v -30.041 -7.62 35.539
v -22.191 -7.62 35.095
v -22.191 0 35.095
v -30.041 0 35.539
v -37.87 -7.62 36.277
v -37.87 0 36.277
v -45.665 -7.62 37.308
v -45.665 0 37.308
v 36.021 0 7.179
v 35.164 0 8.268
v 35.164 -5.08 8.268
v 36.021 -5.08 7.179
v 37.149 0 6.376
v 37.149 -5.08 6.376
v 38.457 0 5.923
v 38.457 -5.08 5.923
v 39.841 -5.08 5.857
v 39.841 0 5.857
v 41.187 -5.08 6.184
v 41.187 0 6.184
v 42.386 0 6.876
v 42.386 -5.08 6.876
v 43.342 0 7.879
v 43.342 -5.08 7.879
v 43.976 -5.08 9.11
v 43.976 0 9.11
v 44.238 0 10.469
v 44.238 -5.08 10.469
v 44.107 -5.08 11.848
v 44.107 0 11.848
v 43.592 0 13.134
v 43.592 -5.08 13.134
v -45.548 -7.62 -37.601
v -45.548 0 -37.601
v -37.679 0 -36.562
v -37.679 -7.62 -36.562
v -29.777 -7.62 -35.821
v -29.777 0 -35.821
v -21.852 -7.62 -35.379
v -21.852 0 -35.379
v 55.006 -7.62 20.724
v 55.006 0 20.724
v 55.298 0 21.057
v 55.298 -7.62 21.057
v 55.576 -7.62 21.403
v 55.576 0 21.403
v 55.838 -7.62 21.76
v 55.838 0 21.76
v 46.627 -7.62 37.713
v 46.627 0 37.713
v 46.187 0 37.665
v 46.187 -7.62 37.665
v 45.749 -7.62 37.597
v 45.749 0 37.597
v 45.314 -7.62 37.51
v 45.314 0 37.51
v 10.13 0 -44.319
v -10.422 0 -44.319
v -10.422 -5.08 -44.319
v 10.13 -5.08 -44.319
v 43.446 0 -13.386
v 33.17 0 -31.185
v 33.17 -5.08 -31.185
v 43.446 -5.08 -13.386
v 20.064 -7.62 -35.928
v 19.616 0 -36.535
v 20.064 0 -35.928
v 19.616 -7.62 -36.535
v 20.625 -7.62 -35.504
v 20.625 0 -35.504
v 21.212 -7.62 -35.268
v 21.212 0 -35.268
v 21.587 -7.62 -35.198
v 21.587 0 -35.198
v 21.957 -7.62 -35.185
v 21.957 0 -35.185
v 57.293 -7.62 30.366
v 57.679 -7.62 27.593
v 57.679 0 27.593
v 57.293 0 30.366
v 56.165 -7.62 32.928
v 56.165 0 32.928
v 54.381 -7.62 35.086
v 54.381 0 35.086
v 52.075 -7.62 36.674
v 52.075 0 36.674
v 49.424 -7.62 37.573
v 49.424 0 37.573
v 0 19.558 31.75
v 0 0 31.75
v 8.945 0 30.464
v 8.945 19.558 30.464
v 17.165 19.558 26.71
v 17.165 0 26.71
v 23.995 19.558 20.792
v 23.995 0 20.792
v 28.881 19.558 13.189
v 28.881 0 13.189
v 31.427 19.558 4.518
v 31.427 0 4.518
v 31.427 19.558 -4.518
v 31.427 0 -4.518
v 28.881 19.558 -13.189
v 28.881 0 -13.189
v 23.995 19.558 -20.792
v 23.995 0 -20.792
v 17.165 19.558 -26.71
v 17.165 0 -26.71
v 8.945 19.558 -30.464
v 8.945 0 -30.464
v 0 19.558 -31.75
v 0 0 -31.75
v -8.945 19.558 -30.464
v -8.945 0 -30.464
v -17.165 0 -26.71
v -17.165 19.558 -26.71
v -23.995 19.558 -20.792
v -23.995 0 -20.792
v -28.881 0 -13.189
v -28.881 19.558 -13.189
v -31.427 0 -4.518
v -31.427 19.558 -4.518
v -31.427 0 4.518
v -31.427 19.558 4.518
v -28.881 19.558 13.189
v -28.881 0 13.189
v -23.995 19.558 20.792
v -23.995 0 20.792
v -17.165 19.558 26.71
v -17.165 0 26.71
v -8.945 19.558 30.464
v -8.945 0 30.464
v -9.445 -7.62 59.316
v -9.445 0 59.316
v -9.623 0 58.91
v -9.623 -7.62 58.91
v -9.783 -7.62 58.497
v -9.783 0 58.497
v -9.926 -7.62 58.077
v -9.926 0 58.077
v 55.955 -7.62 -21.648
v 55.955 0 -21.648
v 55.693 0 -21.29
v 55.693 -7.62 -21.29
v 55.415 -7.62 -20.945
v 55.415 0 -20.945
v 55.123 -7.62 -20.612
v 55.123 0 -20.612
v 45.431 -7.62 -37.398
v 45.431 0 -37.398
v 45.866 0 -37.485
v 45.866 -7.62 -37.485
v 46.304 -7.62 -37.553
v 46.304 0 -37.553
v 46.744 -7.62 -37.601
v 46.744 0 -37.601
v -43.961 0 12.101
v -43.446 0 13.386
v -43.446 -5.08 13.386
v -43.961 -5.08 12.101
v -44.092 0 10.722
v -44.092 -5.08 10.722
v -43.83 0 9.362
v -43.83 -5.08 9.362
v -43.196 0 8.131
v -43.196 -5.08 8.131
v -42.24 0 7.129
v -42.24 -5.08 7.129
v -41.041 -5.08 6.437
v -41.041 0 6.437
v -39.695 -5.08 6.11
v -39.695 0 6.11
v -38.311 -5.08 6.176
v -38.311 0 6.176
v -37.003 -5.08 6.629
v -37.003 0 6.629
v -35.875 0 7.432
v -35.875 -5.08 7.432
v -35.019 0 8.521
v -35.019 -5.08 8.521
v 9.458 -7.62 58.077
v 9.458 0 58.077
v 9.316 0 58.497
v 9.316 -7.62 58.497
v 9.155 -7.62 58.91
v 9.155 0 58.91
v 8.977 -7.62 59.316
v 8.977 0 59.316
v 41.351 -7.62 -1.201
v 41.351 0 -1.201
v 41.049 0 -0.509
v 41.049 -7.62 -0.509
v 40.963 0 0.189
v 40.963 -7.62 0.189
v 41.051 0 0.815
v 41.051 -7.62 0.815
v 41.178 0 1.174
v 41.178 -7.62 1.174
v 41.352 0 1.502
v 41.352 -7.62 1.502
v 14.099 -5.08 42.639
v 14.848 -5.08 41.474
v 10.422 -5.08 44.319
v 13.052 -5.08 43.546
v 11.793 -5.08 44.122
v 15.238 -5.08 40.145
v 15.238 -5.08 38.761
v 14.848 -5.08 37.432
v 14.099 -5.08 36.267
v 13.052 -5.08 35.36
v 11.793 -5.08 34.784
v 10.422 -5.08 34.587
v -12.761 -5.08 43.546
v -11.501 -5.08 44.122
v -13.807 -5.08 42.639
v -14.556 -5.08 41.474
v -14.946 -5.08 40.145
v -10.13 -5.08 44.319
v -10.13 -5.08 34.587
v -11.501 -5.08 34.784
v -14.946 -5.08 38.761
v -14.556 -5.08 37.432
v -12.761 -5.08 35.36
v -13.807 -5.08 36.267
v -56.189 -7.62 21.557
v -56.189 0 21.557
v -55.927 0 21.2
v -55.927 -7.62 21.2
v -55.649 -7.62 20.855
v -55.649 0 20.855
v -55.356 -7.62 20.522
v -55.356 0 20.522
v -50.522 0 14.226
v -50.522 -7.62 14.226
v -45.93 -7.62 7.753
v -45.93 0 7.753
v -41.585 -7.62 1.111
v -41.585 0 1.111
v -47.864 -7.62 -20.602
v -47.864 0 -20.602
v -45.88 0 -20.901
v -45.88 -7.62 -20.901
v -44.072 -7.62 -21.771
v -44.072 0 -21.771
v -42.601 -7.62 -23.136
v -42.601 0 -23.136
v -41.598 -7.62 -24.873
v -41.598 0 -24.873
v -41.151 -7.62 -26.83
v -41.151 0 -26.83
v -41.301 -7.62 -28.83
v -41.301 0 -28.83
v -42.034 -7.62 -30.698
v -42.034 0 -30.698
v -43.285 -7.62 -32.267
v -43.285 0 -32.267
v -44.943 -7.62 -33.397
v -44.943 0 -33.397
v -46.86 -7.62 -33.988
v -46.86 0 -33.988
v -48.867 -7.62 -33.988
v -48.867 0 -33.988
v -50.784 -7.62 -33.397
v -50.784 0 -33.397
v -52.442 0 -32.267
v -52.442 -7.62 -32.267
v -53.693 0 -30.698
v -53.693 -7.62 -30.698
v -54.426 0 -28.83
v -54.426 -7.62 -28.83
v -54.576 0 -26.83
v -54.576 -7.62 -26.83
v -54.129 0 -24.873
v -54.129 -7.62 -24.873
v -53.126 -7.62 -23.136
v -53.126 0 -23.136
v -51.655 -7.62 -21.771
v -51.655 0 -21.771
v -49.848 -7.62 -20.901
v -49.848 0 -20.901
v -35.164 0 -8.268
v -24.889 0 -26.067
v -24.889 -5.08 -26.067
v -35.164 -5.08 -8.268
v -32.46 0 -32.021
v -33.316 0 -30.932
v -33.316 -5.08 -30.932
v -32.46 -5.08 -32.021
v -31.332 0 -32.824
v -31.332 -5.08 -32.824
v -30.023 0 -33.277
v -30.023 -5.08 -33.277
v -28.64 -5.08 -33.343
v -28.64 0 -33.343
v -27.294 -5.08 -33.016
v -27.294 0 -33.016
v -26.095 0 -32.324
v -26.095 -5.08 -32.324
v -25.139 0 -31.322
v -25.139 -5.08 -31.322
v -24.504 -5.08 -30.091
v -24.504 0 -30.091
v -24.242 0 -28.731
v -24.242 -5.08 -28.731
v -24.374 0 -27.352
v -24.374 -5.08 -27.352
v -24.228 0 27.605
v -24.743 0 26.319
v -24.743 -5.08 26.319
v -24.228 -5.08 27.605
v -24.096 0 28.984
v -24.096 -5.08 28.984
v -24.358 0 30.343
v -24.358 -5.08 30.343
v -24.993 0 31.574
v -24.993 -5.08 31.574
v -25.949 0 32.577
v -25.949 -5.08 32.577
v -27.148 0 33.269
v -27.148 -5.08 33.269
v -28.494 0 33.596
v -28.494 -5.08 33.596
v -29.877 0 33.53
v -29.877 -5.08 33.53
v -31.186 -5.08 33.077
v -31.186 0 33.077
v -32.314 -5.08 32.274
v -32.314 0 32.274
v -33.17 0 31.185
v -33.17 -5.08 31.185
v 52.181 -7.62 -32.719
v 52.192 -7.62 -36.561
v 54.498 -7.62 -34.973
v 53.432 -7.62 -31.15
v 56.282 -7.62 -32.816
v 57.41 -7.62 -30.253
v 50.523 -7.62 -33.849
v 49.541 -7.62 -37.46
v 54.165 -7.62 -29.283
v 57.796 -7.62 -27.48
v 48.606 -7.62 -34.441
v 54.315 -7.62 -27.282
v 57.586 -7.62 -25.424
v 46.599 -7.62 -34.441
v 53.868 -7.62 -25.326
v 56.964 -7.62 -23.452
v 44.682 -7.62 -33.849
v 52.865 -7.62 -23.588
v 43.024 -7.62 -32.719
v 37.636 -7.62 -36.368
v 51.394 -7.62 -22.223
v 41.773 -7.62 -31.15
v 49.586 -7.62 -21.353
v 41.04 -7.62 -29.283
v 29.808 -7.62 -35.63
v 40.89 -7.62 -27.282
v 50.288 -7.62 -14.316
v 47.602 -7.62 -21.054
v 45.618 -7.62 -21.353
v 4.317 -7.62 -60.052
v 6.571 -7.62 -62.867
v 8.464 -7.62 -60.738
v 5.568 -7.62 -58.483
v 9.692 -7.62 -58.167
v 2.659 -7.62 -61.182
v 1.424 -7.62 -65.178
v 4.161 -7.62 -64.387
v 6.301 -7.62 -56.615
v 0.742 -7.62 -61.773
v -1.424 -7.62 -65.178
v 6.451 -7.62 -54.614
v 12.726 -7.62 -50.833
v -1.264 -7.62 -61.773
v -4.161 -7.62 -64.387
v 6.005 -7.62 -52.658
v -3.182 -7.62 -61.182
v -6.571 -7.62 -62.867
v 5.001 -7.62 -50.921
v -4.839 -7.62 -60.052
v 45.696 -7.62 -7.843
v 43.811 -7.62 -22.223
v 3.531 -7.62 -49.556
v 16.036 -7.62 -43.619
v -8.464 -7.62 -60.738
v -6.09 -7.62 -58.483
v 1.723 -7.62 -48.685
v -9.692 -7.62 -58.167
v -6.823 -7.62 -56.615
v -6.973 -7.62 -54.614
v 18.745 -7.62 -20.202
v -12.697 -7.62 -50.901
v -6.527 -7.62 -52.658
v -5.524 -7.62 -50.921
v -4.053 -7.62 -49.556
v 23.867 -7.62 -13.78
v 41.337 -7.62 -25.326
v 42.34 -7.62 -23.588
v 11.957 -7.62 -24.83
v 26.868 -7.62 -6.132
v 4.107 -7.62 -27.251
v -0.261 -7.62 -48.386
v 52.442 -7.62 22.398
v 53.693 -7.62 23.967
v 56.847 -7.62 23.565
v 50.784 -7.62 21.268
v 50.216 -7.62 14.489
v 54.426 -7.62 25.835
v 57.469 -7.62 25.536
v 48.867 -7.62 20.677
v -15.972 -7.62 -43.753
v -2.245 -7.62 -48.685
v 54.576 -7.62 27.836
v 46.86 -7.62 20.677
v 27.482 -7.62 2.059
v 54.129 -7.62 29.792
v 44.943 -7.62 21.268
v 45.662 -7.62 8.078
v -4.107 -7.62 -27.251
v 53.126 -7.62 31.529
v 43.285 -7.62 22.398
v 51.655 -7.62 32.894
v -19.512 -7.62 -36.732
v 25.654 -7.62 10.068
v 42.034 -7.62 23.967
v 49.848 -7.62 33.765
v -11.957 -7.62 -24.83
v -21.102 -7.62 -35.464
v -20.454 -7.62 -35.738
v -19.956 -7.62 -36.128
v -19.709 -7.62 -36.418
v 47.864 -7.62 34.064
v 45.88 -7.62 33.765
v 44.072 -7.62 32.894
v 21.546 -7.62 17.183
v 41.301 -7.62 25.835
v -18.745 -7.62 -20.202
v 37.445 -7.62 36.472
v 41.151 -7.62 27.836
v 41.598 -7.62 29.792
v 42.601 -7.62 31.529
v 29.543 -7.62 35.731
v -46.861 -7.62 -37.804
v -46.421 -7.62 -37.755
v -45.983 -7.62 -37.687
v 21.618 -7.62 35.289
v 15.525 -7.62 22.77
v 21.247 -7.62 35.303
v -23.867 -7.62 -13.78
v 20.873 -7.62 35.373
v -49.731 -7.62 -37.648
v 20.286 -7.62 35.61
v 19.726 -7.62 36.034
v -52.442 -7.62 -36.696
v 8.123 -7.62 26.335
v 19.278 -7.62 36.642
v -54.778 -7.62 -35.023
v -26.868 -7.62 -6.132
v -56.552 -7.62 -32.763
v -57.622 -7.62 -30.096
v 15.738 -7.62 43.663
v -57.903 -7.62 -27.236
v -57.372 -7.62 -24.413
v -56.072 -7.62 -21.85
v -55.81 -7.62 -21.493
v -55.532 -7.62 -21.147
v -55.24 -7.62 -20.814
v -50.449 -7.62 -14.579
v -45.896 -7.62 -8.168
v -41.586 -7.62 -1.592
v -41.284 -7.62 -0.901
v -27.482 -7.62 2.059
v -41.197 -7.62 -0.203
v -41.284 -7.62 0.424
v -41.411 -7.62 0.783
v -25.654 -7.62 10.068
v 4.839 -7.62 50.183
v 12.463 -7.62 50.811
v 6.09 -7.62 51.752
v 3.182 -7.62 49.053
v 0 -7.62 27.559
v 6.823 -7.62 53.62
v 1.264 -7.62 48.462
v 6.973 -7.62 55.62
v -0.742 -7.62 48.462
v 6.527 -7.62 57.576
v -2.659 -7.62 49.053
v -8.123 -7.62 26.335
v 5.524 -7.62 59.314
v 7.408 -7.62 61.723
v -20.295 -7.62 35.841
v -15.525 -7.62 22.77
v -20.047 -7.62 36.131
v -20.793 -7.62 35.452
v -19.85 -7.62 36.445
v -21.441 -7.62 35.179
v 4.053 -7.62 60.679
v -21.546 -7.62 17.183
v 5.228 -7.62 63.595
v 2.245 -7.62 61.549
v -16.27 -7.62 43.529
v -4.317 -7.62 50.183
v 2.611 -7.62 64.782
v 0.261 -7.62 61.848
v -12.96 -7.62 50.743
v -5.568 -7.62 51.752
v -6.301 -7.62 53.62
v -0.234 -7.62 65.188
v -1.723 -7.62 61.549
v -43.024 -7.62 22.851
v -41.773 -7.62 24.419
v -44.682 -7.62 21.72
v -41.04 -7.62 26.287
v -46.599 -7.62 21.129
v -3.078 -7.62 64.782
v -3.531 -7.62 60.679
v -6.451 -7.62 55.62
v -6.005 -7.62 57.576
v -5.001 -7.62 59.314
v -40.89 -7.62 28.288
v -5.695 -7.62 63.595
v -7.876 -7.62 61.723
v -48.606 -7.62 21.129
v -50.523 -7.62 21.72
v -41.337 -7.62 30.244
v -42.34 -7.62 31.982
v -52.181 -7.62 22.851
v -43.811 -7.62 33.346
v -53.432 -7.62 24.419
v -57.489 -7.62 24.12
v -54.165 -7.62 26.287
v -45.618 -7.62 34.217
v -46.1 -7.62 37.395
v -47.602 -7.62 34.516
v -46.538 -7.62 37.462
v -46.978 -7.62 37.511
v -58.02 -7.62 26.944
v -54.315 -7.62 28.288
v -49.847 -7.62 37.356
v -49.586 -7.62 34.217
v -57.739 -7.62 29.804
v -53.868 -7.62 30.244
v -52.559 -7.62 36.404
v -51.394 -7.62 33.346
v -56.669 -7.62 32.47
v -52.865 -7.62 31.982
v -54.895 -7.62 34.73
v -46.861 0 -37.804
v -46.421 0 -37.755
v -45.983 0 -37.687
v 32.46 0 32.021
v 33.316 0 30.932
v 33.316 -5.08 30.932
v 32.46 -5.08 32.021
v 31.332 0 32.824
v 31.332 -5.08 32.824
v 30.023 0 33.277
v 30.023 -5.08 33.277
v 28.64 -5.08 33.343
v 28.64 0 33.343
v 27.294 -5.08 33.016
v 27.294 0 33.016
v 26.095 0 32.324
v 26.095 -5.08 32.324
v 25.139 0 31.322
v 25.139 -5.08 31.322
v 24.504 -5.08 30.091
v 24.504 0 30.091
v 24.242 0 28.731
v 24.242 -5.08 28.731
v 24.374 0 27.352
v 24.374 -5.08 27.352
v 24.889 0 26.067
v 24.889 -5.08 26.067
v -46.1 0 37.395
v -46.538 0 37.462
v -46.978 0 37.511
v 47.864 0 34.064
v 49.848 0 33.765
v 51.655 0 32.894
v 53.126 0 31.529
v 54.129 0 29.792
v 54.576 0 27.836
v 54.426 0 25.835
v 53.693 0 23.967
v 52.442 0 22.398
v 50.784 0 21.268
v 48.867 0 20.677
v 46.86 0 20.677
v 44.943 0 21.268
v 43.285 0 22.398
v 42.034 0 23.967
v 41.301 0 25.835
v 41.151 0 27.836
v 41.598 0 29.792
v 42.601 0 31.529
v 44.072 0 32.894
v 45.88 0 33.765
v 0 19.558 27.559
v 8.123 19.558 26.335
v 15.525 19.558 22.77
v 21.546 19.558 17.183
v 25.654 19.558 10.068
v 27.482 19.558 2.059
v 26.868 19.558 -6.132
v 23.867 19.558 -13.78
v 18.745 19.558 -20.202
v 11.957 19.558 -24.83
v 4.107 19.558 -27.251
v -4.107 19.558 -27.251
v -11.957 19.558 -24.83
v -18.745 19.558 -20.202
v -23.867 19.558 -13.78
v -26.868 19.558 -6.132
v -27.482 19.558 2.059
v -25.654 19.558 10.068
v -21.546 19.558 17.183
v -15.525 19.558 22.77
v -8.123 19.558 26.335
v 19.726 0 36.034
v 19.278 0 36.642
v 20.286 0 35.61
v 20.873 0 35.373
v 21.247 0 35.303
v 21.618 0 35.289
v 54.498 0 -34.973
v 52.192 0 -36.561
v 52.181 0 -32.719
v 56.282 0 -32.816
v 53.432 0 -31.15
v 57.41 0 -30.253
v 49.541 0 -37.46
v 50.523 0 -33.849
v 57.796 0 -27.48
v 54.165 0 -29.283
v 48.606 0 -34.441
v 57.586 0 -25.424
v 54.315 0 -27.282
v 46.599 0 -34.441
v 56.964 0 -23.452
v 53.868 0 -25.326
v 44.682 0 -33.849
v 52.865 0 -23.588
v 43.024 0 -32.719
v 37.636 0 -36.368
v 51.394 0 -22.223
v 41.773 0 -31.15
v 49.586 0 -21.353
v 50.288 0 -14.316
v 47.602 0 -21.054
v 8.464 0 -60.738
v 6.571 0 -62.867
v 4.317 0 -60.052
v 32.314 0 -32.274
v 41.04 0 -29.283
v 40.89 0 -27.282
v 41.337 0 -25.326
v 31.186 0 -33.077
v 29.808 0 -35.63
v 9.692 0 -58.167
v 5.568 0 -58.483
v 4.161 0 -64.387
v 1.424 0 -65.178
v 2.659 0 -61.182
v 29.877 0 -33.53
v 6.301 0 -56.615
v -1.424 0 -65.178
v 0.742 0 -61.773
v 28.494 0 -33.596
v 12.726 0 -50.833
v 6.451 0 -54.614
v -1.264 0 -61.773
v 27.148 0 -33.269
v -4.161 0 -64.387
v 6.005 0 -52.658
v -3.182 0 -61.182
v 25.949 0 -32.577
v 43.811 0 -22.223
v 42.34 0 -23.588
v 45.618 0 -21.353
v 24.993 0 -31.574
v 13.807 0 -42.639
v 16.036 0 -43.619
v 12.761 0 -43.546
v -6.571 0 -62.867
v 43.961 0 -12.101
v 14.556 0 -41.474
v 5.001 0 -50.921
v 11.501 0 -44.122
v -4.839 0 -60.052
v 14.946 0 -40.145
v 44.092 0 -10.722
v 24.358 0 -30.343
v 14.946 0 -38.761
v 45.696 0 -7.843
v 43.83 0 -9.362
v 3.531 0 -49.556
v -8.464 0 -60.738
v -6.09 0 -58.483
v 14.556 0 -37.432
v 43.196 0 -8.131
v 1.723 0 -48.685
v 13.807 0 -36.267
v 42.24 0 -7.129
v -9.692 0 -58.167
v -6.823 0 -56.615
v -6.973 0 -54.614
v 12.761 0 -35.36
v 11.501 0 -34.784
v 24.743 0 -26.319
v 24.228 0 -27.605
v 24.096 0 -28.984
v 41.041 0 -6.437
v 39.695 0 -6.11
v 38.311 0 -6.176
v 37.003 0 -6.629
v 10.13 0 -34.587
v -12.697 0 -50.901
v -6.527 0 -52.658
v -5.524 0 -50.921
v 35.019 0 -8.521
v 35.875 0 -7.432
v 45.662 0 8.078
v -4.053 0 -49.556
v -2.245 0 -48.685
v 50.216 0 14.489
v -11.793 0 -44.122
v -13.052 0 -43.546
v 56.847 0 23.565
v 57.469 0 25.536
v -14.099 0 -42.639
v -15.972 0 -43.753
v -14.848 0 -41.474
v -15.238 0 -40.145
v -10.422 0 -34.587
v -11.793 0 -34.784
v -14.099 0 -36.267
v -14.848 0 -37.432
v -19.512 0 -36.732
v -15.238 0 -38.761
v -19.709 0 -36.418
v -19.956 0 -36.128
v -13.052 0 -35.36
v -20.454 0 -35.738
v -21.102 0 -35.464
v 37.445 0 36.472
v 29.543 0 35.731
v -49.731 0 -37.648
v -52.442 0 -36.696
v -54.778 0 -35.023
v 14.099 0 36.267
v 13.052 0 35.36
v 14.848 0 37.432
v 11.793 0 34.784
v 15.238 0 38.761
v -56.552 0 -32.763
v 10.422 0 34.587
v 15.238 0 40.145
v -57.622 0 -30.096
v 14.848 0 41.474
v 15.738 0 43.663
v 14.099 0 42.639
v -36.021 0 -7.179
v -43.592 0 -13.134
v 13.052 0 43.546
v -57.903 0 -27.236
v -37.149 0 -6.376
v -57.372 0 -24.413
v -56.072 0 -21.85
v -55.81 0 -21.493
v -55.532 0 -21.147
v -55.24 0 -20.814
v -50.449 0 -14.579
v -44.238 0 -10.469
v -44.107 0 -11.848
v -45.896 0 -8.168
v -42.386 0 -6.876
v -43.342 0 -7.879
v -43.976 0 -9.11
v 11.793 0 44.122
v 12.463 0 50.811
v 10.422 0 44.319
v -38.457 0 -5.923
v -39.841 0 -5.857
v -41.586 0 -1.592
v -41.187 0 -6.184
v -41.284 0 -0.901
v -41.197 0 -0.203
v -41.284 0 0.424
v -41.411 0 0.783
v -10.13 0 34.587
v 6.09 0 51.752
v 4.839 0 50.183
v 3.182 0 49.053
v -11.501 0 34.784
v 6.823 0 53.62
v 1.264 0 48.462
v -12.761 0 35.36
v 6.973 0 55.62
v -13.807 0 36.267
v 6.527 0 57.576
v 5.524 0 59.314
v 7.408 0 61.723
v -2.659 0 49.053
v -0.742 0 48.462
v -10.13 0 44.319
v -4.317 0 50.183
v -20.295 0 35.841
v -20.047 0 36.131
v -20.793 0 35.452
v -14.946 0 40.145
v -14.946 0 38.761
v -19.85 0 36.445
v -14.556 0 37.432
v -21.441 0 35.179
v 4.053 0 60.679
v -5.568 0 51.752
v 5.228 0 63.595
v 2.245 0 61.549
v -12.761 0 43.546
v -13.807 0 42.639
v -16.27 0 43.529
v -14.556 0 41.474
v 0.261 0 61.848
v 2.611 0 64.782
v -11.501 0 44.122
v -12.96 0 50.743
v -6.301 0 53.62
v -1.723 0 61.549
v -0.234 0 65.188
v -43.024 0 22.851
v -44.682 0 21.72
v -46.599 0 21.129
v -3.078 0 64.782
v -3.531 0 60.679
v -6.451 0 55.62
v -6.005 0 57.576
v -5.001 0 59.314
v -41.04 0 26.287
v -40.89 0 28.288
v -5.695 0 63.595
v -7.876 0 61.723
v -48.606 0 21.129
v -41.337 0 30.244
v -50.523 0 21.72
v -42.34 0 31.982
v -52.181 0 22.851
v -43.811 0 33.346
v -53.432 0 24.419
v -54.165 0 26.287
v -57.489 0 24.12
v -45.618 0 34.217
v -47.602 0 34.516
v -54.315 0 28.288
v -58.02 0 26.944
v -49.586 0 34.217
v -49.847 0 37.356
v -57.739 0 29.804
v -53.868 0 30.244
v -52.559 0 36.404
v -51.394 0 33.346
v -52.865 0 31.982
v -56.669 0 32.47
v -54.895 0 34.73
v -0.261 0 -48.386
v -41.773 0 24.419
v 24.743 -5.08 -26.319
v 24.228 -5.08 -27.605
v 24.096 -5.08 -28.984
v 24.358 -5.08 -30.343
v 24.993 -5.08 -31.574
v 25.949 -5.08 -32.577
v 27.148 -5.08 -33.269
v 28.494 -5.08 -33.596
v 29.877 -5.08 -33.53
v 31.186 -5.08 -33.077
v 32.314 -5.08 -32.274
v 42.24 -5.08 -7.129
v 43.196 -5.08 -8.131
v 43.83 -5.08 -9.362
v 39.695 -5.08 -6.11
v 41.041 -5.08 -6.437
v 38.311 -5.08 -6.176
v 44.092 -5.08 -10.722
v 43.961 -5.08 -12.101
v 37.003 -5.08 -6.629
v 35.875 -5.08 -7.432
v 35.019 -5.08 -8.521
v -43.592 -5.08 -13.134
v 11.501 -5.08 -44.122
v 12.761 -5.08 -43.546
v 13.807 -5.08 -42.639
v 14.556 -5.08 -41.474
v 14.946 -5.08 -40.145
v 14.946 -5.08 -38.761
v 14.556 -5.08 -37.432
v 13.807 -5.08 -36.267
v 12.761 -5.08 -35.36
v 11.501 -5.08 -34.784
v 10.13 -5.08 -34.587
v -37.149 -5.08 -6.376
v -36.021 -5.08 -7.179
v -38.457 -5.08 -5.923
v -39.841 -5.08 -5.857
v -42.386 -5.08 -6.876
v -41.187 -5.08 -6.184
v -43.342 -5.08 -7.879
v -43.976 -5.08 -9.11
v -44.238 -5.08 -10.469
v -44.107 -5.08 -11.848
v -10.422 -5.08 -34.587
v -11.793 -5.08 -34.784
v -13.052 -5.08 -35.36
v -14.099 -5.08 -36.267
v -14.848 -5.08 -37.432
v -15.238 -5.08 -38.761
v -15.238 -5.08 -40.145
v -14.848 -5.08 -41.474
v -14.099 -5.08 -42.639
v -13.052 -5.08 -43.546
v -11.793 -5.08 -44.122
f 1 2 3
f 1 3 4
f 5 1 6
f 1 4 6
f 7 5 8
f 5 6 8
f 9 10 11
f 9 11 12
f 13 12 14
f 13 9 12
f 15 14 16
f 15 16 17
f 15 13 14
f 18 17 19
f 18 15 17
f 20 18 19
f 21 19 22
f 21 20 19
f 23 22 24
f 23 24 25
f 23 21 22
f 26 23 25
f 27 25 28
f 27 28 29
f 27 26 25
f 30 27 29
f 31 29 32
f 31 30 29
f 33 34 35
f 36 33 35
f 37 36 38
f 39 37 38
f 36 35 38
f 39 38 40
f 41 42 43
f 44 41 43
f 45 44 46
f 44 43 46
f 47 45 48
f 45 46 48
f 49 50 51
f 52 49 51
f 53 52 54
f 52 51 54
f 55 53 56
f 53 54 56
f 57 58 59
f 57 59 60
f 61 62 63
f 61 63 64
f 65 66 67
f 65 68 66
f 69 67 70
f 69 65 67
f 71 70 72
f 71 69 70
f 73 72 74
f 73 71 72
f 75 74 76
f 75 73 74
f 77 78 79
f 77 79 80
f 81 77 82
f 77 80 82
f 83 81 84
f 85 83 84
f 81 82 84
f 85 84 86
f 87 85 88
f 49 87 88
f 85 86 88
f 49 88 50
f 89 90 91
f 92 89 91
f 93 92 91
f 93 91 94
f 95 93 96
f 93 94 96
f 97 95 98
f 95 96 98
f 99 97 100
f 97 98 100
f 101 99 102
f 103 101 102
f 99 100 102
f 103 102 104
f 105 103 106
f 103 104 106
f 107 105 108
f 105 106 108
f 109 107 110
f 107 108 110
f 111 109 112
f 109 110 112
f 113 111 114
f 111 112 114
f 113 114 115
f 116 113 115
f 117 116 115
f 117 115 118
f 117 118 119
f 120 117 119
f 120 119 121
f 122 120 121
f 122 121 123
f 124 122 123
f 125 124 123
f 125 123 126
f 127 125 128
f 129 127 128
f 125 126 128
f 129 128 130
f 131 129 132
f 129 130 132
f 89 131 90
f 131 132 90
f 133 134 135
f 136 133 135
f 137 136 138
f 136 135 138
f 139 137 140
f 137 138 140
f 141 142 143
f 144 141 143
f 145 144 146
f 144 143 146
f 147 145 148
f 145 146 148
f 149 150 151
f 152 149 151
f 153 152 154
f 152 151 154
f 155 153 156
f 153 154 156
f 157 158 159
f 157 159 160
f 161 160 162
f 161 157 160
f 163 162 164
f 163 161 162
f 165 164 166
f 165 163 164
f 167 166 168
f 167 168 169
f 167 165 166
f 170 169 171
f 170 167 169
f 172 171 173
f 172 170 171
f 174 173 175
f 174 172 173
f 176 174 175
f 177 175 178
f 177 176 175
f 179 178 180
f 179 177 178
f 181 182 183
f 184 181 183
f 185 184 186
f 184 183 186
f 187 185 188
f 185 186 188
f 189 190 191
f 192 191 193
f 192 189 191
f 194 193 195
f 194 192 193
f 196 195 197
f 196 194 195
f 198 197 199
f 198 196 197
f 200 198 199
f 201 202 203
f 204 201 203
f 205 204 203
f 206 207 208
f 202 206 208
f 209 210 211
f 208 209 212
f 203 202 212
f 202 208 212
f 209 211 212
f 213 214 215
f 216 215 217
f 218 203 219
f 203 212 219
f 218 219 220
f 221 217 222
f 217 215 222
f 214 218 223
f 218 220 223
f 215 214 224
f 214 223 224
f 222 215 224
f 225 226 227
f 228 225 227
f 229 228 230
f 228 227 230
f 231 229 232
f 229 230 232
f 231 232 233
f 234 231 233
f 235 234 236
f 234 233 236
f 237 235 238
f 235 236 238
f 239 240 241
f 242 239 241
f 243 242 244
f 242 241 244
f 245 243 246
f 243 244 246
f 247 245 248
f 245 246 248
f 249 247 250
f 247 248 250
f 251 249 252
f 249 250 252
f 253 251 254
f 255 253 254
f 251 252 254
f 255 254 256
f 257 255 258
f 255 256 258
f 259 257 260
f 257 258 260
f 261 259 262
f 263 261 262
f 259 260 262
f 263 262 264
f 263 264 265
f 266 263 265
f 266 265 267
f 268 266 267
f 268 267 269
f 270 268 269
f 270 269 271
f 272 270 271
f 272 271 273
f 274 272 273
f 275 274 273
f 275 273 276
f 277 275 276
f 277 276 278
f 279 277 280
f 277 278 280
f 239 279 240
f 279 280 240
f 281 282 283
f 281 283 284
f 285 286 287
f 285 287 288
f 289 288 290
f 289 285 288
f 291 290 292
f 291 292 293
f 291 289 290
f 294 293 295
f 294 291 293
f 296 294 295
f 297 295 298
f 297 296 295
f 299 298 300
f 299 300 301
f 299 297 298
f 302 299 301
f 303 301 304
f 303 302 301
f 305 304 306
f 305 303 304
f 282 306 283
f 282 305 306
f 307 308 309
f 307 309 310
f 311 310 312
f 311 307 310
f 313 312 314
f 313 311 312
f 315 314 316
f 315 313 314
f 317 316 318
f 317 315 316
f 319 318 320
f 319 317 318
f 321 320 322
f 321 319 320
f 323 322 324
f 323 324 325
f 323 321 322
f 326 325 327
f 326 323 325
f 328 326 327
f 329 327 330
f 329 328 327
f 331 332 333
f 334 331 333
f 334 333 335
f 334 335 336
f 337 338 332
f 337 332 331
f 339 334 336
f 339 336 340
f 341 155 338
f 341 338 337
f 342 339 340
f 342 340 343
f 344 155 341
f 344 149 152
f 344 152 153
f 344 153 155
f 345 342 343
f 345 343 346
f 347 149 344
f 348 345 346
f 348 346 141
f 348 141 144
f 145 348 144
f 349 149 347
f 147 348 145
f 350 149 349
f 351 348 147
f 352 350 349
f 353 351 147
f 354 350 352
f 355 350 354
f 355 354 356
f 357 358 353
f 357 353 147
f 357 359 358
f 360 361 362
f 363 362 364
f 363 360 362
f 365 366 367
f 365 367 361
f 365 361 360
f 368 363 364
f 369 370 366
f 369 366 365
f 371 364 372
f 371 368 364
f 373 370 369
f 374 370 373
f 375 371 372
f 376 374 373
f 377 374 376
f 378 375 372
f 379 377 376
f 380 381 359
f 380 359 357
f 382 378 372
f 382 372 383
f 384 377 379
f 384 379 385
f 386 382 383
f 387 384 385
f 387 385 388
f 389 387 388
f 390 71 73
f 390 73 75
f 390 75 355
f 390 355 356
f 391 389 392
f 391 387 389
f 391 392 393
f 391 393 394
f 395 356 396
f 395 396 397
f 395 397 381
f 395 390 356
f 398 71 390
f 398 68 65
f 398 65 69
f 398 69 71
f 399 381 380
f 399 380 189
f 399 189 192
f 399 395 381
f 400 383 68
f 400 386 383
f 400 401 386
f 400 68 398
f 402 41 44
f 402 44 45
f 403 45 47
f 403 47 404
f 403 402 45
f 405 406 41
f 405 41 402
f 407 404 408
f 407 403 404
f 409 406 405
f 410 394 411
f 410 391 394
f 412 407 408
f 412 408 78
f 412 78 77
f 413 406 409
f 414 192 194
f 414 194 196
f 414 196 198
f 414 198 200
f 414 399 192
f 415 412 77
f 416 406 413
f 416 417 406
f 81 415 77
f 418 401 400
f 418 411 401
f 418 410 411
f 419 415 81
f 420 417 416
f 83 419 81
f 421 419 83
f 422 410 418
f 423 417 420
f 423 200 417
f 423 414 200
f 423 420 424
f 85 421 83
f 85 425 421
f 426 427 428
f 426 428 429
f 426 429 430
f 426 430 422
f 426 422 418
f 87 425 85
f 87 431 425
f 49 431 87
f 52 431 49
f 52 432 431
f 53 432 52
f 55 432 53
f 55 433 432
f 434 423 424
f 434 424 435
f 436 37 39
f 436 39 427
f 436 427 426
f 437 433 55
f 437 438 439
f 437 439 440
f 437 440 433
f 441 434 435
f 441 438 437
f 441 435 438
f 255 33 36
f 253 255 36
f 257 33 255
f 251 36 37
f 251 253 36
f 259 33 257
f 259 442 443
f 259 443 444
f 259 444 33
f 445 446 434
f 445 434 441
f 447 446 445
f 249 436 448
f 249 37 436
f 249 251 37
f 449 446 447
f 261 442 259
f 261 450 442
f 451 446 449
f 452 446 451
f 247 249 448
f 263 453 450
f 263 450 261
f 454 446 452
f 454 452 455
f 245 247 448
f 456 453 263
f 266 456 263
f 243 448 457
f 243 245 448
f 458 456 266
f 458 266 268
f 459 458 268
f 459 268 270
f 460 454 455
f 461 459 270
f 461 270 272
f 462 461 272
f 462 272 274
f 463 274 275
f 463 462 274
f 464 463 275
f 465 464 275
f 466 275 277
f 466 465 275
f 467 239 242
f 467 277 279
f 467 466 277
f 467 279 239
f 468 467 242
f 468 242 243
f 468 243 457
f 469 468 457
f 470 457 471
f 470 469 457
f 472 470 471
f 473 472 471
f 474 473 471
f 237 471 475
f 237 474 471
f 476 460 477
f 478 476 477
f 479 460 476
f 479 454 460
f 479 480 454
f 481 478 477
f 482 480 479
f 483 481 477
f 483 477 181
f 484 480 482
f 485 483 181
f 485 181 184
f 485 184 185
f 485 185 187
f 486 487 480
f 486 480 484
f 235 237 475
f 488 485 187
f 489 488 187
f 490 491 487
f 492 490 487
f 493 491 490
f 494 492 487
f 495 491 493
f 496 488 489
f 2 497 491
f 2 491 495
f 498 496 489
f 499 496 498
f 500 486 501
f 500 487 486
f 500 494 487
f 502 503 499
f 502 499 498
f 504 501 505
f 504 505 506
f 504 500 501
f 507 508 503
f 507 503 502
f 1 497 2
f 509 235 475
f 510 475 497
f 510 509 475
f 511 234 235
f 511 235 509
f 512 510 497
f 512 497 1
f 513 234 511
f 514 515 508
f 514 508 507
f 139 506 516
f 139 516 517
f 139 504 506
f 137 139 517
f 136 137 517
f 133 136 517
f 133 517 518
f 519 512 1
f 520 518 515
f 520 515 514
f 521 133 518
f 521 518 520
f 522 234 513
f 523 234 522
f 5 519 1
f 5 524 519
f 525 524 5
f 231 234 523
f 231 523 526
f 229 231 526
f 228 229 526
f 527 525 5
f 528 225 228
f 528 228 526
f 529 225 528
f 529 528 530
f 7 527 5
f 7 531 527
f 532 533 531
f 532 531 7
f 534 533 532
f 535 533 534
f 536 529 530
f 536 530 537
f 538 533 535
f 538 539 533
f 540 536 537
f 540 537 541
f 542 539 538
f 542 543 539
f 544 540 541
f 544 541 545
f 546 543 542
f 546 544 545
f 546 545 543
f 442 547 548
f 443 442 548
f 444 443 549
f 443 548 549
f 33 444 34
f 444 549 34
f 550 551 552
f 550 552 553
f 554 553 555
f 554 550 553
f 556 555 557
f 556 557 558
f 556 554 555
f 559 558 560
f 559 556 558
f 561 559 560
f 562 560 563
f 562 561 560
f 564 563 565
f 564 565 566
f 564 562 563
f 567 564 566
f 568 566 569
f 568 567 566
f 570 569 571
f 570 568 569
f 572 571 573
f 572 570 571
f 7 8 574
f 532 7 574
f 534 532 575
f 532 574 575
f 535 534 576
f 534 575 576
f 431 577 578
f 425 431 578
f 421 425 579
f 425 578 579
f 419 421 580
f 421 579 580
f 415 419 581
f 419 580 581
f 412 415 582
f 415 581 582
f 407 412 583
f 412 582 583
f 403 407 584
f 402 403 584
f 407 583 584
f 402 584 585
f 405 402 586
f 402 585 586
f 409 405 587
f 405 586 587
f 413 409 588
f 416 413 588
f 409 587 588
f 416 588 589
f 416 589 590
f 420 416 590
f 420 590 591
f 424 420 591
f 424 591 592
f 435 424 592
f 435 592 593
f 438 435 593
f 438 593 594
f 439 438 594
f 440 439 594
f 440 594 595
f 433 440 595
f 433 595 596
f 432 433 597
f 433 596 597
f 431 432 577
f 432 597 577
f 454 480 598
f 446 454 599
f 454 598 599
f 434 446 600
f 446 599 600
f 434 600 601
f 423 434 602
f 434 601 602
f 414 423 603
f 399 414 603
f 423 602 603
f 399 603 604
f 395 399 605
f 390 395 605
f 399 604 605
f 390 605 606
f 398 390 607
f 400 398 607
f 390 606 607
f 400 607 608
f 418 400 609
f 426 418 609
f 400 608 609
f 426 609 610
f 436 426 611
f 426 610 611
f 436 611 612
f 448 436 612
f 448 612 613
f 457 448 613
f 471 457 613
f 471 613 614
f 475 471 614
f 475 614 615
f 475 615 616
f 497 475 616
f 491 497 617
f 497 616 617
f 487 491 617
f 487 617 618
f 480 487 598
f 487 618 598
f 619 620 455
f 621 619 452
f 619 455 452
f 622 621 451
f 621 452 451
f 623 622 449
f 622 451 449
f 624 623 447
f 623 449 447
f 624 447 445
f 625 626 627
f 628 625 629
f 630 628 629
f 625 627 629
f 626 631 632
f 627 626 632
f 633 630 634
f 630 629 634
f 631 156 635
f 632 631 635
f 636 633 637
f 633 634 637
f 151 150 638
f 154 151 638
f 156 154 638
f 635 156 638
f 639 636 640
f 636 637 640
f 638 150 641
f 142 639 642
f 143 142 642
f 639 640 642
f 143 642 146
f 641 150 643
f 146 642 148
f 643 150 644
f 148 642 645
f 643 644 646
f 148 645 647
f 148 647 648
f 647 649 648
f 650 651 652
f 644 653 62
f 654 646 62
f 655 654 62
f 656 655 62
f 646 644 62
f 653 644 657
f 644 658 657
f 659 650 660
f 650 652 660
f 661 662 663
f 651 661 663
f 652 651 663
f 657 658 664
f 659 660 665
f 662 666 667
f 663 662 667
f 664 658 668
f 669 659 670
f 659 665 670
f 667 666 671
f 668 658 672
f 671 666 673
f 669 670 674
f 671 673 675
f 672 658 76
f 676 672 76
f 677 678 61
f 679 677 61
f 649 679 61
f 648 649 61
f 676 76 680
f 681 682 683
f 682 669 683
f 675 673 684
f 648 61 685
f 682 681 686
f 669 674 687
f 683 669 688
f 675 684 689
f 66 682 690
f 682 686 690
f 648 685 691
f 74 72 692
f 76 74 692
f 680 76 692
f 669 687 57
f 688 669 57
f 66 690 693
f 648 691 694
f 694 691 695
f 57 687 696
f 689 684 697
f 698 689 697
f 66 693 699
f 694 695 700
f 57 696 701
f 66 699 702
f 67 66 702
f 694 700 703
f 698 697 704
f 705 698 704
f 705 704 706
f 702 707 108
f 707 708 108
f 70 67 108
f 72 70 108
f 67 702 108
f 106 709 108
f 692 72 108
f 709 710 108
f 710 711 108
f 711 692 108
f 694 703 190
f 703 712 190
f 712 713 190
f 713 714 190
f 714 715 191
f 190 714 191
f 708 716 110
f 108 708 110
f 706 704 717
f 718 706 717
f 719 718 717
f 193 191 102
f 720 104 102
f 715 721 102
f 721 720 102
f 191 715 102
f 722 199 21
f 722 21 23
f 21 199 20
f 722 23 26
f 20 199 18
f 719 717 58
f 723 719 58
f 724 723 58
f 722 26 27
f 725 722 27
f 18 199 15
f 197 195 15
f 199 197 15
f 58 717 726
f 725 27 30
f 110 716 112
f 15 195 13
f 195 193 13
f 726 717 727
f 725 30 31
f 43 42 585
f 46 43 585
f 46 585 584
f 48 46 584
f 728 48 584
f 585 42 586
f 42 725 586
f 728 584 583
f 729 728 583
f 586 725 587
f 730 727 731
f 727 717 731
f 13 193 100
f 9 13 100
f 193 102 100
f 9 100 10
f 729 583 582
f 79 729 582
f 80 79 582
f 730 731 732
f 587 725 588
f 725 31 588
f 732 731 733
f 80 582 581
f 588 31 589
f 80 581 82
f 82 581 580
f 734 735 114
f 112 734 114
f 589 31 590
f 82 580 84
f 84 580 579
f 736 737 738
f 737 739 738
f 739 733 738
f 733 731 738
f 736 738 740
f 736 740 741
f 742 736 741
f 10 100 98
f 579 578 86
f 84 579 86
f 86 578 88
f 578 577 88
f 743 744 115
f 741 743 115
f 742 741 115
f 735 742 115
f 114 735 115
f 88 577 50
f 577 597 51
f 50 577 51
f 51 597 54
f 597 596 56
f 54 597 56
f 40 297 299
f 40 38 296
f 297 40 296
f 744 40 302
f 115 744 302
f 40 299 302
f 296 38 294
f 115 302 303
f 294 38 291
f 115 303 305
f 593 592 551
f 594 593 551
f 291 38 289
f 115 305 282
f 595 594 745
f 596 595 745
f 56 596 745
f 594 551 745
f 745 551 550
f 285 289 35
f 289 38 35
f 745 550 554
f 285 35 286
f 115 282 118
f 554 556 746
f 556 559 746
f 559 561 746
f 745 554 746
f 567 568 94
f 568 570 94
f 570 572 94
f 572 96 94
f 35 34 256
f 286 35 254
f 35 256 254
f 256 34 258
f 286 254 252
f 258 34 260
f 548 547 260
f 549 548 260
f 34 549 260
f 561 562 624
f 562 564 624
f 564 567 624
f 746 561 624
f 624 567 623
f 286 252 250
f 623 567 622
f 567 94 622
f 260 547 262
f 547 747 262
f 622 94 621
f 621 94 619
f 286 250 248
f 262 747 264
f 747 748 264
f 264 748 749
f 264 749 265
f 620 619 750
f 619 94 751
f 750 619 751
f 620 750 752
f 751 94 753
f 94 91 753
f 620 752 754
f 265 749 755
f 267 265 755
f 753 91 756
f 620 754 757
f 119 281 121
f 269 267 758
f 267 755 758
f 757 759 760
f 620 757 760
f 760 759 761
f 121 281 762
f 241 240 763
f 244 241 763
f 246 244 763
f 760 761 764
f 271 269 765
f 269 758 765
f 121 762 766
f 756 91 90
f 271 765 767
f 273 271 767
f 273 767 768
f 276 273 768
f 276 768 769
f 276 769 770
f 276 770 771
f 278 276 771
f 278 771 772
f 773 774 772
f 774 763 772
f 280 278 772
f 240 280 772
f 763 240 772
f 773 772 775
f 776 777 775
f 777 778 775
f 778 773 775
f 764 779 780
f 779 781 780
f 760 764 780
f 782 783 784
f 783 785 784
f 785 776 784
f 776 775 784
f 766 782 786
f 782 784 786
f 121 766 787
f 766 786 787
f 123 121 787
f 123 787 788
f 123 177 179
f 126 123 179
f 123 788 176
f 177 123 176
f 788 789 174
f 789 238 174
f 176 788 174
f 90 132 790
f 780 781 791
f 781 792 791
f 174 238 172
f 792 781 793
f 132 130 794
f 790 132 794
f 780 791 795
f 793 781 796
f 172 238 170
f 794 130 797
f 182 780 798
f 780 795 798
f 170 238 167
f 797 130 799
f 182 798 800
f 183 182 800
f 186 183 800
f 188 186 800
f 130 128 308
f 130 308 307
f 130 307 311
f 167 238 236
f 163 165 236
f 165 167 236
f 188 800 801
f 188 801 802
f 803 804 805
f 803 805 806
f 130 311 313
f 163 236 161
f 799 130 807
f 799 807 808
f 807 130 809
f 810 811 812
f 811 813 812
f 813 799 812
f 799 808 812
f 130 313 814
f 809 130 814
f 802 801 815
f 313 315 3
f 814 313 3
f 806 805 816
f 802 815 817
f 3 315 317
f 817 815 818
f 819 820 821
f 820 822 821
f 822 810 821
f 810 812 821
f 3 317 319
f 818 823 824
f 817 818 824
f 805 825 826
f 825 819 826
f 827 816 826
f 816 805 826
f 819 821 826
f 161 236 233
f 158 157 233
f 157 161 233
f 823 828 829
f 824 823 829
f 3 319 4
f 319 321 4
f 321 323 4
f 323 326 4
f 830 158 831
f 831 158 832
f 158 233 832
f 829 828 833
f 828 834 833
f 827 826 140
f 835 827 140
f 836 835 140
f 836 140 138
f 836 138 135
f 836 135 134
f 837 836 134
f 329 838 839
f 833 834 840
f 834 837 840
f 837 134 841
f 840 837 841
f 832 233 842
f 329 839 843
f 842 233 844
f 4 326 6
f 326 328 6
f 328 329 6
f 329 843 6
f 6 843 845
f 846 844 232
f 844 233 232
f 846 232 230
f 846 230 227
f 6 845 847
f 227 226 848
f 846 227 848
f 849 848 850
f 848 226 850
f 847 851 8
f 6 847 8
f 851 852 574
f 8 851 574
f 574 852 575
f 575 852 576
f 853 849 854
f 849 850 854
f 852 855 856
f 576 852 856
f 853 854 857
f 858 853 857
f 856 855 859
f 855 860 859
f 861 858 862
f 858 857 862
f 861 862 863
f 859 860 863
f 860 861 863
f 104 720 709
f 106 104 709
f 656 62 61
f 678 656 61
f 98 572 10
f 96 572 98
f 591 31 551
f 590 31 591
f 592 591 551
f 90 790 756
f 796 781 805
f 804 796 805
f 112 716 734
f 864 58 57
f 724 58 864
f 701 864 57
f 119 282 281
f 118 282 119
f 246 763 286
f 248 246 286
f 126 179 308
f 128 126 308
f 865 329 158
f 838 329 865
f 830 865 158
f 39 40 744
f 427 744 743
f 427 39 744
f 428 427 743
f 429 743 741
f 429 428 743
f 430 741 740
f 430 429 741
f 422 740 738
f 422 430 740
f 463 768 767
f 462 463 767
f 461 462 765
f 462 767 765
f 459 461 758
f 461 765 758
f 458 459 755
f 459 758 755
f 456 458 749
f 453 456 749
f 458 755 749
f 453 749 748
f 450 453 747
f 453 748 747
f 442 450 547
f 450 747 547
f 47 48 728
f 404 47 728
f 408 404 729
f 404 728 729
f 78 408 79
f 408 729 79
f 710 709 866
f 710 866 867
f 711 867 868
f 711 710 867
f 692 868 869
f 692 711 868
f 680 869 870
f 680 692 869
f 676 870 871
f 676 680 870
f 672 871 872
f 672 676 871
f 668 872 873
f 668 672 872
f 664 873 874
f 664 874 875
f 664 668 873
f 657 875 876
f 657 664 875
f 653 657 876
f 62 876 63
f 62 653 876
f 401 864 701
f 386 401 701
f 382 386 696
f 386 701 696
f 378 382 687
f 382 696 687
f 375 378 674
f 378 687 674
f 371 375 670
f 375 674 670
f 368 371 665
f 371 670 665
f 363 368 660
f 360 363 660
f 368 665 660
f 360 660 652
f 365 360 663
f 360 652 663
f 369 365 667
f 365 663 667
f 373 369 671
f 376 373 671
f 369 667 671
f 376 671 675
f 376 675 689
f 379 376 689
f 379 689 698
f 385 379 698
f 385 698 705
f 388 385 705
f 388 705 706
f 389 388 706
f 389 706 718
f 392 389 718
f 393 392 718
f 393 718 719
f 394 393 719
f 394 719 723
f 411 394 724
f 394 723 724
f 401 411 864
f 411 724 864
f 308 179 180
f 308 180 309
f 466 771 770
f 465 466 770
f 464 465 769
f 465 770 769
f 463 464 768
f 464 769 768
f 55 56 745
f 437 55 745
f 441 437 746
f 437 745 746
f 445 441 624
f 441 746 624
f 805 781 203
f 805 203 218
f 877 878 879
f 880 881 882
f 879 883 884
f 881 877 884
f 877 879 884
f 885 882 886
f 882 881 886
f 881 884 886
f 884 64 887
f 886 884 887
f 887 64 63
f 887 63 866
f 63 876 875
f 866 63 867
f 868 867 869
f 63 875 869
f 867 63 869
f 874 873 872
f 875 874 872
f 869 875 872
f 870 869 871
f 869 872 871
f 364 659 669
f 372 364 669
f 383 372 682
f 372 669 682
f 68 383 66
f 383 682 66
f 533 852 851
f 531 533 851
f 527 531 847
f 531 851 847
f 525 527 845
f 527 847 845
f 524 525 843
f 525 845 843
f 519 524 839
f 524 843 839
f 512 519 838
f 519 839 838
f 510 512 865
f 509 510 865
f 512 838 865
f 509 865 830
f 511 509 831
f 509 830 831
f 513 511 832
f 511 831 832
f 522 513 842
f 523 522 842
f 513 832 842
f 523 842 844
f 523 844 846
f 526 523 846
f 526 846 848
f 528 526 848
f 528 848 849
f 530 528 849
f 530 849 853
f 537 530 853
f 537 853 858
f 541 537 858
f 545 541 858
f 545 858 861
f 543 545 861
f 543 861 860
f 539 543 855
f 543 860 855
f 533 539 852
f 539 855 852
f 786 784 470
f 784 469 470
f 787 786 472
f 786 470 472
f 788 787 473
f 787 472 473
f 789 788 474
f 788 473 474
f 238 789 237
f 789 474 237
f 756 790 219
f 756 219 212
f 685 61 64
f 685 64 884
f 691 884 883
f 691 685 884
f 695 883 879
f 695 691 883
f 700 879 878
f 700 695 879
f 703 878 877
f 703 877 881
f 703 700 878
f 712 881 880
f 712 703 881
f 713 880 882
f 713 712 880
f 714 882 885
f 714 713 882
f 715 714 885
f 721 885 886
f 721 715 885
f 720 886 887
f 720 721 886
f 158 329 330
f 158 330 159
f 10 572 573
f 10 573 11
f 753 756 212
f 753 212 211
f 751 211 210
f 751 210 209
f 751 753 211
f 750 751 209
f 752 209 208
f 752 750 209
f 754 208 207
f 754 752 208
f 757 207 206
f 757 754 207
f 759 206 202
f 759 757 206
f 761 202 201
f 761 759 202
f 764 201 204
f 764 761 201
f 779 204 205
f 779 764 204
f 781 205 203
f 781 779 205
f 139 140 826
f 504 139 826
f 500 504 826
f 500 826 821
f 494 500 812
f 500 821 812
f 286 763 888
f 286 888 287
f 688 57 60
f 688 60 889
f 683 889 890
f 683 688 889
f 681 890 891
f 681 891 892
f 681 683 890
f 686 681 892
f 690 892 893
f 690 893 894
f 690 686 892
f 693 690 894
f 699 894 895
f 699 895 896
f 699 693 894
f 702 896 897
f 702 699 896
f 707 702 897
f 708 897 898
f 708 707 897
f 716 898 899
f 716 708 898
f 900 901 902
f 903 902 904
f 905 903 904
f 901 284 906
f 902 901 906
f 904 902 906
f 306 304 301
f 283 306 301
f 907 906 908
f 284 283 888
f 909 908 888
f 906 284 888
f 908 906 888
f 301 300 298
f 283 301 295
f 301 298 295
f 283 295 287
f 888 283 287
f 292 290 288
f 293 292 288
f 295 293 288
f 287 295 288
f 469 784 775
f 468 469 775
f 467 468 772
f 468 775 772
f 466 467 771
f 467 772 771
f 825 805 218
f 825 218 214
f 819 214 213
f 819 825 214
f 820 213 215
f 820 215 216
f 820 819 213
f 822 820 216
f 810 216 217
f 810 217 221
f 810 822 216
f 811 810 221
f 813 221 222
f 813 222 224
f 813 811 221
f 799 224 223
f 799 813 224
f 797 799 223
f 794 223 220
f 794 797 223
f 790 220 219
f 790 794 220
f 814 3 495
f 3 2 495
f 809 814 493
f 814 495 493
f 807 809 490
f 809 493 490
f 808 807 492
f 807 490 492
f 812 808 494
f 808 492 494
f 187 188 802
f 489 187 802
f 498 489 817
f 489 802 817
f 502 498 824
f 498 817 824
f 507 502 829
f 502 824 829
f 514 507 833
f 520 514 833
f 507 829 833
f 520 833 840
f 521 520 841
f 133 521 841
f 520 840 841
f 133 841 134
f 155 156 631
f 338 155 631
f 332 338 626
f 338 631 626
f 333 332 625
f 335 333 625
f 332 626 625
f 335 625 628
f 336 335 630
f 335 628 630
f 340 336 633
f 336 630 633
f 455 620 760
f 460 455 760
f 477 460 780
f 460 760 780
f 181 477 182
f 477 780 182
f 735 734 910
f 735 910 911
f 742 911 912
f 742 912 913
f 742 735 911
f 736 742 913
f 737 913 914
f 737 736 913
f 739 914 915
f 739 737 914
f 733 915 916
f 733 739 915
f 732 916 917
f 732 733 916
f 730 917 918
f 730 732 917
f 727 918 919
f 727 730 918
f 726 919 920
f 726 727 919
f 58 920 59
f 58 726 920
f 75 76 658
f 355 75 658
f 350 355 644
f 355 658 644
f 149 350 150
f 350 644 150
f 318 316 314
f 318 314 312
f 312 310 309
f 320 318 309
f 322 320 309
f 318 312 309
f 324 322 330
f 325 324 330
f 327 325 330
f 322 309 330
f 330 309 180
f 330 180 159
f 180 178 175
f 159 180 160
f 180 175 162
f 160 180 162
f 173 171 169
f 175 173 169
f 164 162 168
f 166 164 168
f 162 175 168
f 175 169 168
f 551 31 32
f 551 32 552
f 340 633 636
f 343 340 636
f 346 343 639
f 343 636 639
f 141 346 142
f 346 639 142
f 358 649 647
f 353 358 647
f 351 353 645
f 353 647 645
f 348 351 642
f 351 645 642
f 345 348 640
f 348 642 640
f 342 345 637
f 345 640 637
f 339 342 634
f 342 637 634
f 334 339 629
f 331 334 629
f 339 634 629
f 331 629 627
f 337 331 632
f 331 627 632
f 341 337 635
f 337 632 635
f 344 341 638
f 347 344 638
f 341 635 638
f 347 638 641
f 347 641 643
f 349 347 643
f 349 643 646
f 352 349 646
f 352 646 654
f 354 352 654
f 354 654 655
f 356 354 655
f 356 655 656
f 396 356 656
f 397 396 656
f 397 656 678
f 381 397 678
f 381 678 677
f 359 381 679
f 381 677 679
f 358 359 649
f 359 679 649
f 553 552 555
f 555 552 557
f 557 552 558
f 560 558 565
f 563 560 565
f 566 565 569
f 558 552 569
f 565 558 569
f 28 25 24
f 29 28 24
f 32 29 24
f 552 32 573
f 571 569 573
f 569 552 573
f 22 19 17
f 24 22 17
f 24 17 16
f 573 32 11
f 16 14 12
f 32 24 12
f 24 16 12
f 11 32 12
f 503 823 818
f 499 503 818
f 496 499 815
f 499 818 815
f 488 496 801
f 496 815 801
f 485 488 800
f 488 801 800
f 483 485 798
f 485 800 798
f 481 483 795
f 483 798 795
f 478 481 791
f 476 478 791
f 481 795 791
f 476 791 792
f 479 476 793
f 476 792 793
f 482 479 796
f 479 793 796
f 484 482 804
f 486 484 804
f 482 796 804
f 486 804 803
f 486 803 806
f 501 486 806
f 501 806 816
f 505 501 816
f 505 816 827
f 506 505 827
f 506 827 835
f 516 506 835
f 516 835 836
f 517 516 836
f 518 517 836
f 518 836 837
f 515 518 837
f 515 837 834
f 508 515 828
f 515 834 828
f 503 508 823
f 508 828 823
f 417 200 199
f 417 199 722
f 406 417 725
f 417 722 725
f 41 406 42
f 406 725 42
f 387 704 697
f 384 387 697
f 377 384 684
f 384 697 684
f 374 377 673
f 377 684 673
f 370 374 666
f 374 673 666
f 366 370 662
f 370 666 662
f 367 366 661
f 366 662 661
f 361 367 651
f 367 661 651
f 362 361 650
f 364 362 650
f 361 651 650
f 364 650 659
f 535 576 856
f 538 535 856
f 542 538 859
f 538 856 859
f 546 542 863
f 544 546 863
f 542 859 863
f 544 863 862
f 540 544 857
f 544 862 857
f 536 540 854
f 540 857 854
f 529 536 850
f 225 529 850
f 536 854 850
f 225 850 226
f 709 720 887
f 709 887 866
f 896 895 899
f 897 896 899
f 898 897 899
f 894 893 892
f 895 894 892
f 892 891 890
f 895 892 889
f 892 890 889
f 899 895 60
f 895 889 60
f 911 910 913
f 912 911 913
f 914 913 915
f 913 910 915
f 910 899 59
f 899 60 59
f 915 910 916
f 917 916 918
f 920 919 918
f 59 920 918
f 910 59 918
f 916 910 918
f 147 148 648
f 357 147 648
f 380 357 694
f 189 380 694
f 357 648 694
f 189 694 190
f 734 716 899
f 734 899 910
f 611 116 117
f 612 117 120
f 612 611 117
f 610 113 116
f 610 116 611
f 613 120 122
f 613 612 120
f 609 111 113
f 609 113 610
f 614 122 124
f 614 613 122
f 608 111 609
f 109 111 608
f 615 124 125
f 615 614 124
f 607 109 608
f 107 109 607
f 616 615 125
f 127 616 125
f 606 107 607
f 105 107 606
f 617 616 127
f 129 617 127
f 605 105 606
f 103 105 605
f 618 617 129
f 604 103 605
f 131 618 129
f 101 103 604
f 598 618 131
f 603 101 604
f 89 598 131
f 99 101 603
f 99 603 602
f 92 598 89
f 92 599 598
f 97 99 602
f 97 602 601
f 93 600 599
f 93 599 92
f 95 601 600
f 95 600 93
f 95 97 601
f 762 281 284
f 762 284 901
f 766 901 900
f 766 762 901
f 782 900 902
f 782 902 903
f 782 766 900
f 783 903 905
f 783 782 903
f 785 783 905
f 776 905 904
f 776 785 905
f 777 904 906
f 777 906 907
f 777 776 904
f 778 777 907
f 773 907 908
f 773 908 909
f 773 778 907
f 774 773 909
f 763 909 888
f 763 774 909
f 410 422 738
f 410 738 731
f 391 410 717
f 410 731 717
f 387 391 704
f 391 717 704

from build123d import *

# Parameters (mm, degrees)
SKETCH1_R                 = 31.75
CENTERCIRCLEEXTRUDE_DEPTH = 19.558
SKETCH2_R                 = 80.01
BASEEXPAND_DEPTH          = 7.62
SKETCH3_R                 = 27.559
CENTERCUT_DEPTH           = 27.178
SKETCH4_R                 = 6.731
OUTERCIRCLECUT_DEPTH      = 7.62
SKETCH8_R                 = 80.01
STARFISHCUT_DEPTH         = 7.62
BATMAN_CUT_DEPTH          = 5.08
FILLET1_R                 = 2.54


with BuildPart() as part:
    # Sketch1 → CenterCircleExtrude (new body)
    with BuildSketch(Plane(origin=(0, 0, 0), x_dir=(1, 0, 0), z_dir=(0, 1, 0))):
        Circle(SKETCH1_R)
    extrude(amount=CENTERCIRCLEEXTRUDE_DEPTH)

    # Sketch2 → BaseExpand (add)
    with BuildSketch(Plane.XZ):
        Circle(SKETCH2_R)
    extrude(amount=BASEEXPAND_DEPTH)

    # Sketch3 → CenterCut (cut)
    with BuildSketch(Plane(origin=(0, 19.558, 0), x_dir=(1, 0, 0), z_dir=(0, 1, 0))):
        Circle(SKETCH3_R)
    extrude(amount=-CENTERCUT_DEPTH, mode=Mode.SUBTRACT)

    # Sketch4 → OuterCircleCut (cut)
    with BuildSketch(Plane(origin=(0, 0, 0), x_dir=(1, 0, 0), z_dir=(0, 1, 0))):
        with Locations((-0.261130397, 55.117381423)):
            Circle(SKETCH4_R)
        with Locations((47.602487304, 27.784836269)):
            Circle(SKETCH4_R)
        with Locations((47.863617701, -27.332545154)):
            Circle(SKETCH4_R)
        with Locations((0.261130397, -55.117381423)):
            Circle(SKETCH4_R)
        with Locations((-47.602487304, -27.784836269)):
            Circle(SKETCH4_R)
        with Locations((-47.863617701, 27.332545154)):
            Circle(SKETCH4_R)
    extrude(amount=-OUTERCIRCLECUT_DEPTH, mode=Mode.SUBTRACT)

    # Sketch8 → StarfishCut (cut)
    with BuildSketch(Plane(origin=(0, 0, 0), x_dir=(1, 0, 0), z_dir=(0, 1, 0))):
        Circle(SKETCH8_R)
        with BuildLine():
            ThreePointArc((-9.691634922, 58.167231466), (0, 65.278), (9.691634922, 58.167231466))
            ThreePointArc((9.691634922, 58.167231466), (14.680421474, 46.487646722), (20.366200635, 35.131036031))
            ThreePointArc((20.366200635, 35.131036031), (32.932591729, 35.888695551), (45.430991402, 37.398079103))
            ThreePointArc((45.430991402, 37.398079103), (46.084351809, 37.521062437), (46.744356679, 37.60105177))
            ThreePointArc((46.744356679, 37.60105177), (54.497784748, 34.973113956), (57.796096952, 27.480261323))
            ThreePointArc((57.796096952, 27.480261323), (57.324919213, 24.422104494), (55.95508845, 21.647596369))
            ThreePointArc((55.95508845, 21.647596369), (55.55581322, 21.116010052), (55.122626325, 20.611675009))
            ThreePointArc((55.122626325, 20.611675009), (47.502202506, 10.451466749), (40.509978727, -0.15086779))
            ThreePointArc((40.509978727, -0.15086779), (47.449326667, -10.654851952), (55.005691003, -20.7240918))
            ThreePointArc((55.005691003, -20.7240918), (55.438877898, -21.228426843), (55.838153128, -21.76001316))
            ThreePointArc((55.838153128, -21.76001316), (57.207983891, -24.534521285), (57.67916163, -27.592678114))
            ThreePointArc((57.67916163, -27.592678114), (54.380849426, -35.085530747), (46.627421357, -37.713468561))
            ThreePointArc((46.627421357, -37.713468561), (45.967416487, -37.633479228), (45.31405608, -37.510495894))
            ThreePointArc((45.31405608, -37.510495894), (32.70484571, -35.991119409), (20.026842771, -35.236843257))
            ThreePointArc((20.026842771, -35.236843257), (14.399799615, -46.498486939), (9.457764278, -58.077110338))
            ThreePointArc((9.457764278, -58.077110338), (9.237590766, -58.704428716), (8.976861126, -59.316004366))
            ThreePointArc((8.976861126, -59.316004366), (-0.233870644, -65.187878872), (-9.444602414, -59.316004366))
            ThreePointArc((-9.444602414, -59.316004366), (-9.705332054, -58.704428716), (-9.925505566, -58.077110338))
            ThreePointArc((-9.925505566, -58.077110338), (-14.914292118, -46.397525594), (-20.600071279, -35.040914903))
            ThreePointArc((-20.600071279, -35.040914903), (-33.166462373, -35.798574423), (-45.664862046, -37.307957975))
            ThreePointArc((-45.664862046, -37.307957975), (-46.318222453, -37.430941309), (-46.978227323, -37.510930642))
            ThreePointArc((-46.978227323, -37.510930642), (-56.668785698, -32.470140195), (-56.188959094, -21.557475241))
            ThreePointArc((-56.188959094, -21.557475241), (-55.789683864, -21.025888924), (-55.356496969, -20.521553881))
            ThreePointArc((-55.356496969, -20.521553881), (-47.73607315, -10.361345621), (-40.743849371, 0.240988918))
            ThreePointArc((-40.743849371, 0.240988918), (-47.683197311, 10.74497308), (-55.239561647, 20.814212928))
            ThreePointArc((-55.239561647, 20.814212928), (-55.672748542, 21.318547971), (-56.072023772, 21.850134288))
            ThreePointArc((-56.072023772, 21.850134288), (-56.551850376, 32.762799241), (-46.861292001, 37.803589689))
            ThreePointArc((-46.861292001, 37.803589689), (-46.201287131, 37.723600356), (-45.547926724, 37.600617021))
            ThreePointArc((-45.547926724, 37.600617021), (-32.938716354, 36.081240537), (-20.260713415, 35.326964385))
            ThreePointArc((-20.260713415, 35.326964385), (-14.633670259, 46.588608067), (-9.691634922, 58.167231466))
        make_face(mode=Mode.SUBTRACT)
    extrude(amount=-STARFISHCUT_DEPTH, mode=Mode.SUBTRACT)

    # Sketch14 → Batman Cut (cut)
    with BuildSketch(Plane(origin=(0, 0, 0), x_dir=(1, 0, 0), z_dir=(0, 1, 0))):
        with BuildLine():
            Line((35.018559386, 8.520826348), (24.742614343, 26.319285257))
            ThreePointArc((24.742614343, 26.319285257), (26.523552445, 32.965836738), (33.170103927, 31.184898636))
            Line((33.170103927, 31.184898636), (43.446048969, 13.386439727))
            ThreePointArc((43.446048969, 13.386439727), (41.665110867, 6.739888246), (35.018559386, 8.520826348))
        make_face()
        with BuildLine():
            Line((24.888531771, -26.066548858), (35.164476813, -8.268089949))
            ThreePointArc((35.164476813, -8.268089949), (41.811028295, -6.487151847), (43.591966397, -13.133703329))
            Line((43.591966397, -13.133703329), (33.316021354, -30.932162238))
            ThreePointArc((33.316021354, -30.932162238), (26.669469873, -32.71310034), (24.888531771, -26.066548858))
        make_face()
        with BuildLine():
            Line((-10.130027615, -34.587375206), (10.42186247, -34.587375206))
            ThreePointArc((10.42186247, -34.587375206), (15.28747585, -39.452988585), (10.42186247, -44.318601965))
            Line((10.42186247, -44.318601965), (-10.130027615, -44.318601965))
            ThreePointArc((-10.130027615, -44.318601965), (-14.995640994, -39.452988585), (-10.130027615, -34.587375206))
        make_face()
        with BuildLine():
            Line((10.130027615, 34.587375206), (-10.42186247, 34.587375206))
            ThreePointArc((-10.42186247, 34.587375206), (-15.28747585, 39.452988585), (-10.42186247, 44.318601965))
            Line((-10.42186247, 44.318601965), (10.130027615, 44.318601965))
            ThreePointArc((10.130027615, 44.318601965), (14.995640994, 39.452988585), (10.130027615, 34.587375206))
        make_face()
        with BuildLine():
            Line((-35.018559386, -8.520826348), (-24.742614343, -26.319285257))
            ThreePointArc((-24.742614343, -26.319285257), (-26.523552445, -32.965836738), (-33.170103927, -31.184898636))
            Line((-33.170103927, -31.184898636), (-43.446048969, -13.386439727))
            ThreePointArc((-43.446048969, -13.386439727), (-41.665110867, -6.739888246), (-35.018559386, -8.520826348))
        make_face()
        with BuildLine():
            Line((-24.888531771, 26.066548858), (-35.164476813, 8.268089949))
            ThreePointArc((-35.164476813, 8.268089949), (-41.811028295, 6.487151847), (-43.591966397, 13.133703329))
            Line((-43.591966397, 13.133703329), (-33.316021354, 30.932162238))
            ThreePointArc((-33.316021354, 30.932162238), (-26.669469873, 32.71310034), (-24.888531771, 26.066548858))
        make_face()
    extrude(amount=-BATMAN_CUT_DEPTH, mode=Mode.SUBTRACT)

    # Fillet1
    fillet1_edges = [part.edges().sort_by_distance(p)[0] for p in [
        (20.366200635, -3.81, -35.131036031),
        (-20.260713415, -3.81, -35.326964385),
        (-40.743849371, -3.81, -0.240988918),
        (-20.600071279, -3.81, 35.040914903),
        (20.026842771, -3.81, 35.236843257),
        (40.509978727, -3.81, 0.15086779),
    ]]
    fillet(fillet1_edges, radius=FILLET1_R)


solid = part.part
